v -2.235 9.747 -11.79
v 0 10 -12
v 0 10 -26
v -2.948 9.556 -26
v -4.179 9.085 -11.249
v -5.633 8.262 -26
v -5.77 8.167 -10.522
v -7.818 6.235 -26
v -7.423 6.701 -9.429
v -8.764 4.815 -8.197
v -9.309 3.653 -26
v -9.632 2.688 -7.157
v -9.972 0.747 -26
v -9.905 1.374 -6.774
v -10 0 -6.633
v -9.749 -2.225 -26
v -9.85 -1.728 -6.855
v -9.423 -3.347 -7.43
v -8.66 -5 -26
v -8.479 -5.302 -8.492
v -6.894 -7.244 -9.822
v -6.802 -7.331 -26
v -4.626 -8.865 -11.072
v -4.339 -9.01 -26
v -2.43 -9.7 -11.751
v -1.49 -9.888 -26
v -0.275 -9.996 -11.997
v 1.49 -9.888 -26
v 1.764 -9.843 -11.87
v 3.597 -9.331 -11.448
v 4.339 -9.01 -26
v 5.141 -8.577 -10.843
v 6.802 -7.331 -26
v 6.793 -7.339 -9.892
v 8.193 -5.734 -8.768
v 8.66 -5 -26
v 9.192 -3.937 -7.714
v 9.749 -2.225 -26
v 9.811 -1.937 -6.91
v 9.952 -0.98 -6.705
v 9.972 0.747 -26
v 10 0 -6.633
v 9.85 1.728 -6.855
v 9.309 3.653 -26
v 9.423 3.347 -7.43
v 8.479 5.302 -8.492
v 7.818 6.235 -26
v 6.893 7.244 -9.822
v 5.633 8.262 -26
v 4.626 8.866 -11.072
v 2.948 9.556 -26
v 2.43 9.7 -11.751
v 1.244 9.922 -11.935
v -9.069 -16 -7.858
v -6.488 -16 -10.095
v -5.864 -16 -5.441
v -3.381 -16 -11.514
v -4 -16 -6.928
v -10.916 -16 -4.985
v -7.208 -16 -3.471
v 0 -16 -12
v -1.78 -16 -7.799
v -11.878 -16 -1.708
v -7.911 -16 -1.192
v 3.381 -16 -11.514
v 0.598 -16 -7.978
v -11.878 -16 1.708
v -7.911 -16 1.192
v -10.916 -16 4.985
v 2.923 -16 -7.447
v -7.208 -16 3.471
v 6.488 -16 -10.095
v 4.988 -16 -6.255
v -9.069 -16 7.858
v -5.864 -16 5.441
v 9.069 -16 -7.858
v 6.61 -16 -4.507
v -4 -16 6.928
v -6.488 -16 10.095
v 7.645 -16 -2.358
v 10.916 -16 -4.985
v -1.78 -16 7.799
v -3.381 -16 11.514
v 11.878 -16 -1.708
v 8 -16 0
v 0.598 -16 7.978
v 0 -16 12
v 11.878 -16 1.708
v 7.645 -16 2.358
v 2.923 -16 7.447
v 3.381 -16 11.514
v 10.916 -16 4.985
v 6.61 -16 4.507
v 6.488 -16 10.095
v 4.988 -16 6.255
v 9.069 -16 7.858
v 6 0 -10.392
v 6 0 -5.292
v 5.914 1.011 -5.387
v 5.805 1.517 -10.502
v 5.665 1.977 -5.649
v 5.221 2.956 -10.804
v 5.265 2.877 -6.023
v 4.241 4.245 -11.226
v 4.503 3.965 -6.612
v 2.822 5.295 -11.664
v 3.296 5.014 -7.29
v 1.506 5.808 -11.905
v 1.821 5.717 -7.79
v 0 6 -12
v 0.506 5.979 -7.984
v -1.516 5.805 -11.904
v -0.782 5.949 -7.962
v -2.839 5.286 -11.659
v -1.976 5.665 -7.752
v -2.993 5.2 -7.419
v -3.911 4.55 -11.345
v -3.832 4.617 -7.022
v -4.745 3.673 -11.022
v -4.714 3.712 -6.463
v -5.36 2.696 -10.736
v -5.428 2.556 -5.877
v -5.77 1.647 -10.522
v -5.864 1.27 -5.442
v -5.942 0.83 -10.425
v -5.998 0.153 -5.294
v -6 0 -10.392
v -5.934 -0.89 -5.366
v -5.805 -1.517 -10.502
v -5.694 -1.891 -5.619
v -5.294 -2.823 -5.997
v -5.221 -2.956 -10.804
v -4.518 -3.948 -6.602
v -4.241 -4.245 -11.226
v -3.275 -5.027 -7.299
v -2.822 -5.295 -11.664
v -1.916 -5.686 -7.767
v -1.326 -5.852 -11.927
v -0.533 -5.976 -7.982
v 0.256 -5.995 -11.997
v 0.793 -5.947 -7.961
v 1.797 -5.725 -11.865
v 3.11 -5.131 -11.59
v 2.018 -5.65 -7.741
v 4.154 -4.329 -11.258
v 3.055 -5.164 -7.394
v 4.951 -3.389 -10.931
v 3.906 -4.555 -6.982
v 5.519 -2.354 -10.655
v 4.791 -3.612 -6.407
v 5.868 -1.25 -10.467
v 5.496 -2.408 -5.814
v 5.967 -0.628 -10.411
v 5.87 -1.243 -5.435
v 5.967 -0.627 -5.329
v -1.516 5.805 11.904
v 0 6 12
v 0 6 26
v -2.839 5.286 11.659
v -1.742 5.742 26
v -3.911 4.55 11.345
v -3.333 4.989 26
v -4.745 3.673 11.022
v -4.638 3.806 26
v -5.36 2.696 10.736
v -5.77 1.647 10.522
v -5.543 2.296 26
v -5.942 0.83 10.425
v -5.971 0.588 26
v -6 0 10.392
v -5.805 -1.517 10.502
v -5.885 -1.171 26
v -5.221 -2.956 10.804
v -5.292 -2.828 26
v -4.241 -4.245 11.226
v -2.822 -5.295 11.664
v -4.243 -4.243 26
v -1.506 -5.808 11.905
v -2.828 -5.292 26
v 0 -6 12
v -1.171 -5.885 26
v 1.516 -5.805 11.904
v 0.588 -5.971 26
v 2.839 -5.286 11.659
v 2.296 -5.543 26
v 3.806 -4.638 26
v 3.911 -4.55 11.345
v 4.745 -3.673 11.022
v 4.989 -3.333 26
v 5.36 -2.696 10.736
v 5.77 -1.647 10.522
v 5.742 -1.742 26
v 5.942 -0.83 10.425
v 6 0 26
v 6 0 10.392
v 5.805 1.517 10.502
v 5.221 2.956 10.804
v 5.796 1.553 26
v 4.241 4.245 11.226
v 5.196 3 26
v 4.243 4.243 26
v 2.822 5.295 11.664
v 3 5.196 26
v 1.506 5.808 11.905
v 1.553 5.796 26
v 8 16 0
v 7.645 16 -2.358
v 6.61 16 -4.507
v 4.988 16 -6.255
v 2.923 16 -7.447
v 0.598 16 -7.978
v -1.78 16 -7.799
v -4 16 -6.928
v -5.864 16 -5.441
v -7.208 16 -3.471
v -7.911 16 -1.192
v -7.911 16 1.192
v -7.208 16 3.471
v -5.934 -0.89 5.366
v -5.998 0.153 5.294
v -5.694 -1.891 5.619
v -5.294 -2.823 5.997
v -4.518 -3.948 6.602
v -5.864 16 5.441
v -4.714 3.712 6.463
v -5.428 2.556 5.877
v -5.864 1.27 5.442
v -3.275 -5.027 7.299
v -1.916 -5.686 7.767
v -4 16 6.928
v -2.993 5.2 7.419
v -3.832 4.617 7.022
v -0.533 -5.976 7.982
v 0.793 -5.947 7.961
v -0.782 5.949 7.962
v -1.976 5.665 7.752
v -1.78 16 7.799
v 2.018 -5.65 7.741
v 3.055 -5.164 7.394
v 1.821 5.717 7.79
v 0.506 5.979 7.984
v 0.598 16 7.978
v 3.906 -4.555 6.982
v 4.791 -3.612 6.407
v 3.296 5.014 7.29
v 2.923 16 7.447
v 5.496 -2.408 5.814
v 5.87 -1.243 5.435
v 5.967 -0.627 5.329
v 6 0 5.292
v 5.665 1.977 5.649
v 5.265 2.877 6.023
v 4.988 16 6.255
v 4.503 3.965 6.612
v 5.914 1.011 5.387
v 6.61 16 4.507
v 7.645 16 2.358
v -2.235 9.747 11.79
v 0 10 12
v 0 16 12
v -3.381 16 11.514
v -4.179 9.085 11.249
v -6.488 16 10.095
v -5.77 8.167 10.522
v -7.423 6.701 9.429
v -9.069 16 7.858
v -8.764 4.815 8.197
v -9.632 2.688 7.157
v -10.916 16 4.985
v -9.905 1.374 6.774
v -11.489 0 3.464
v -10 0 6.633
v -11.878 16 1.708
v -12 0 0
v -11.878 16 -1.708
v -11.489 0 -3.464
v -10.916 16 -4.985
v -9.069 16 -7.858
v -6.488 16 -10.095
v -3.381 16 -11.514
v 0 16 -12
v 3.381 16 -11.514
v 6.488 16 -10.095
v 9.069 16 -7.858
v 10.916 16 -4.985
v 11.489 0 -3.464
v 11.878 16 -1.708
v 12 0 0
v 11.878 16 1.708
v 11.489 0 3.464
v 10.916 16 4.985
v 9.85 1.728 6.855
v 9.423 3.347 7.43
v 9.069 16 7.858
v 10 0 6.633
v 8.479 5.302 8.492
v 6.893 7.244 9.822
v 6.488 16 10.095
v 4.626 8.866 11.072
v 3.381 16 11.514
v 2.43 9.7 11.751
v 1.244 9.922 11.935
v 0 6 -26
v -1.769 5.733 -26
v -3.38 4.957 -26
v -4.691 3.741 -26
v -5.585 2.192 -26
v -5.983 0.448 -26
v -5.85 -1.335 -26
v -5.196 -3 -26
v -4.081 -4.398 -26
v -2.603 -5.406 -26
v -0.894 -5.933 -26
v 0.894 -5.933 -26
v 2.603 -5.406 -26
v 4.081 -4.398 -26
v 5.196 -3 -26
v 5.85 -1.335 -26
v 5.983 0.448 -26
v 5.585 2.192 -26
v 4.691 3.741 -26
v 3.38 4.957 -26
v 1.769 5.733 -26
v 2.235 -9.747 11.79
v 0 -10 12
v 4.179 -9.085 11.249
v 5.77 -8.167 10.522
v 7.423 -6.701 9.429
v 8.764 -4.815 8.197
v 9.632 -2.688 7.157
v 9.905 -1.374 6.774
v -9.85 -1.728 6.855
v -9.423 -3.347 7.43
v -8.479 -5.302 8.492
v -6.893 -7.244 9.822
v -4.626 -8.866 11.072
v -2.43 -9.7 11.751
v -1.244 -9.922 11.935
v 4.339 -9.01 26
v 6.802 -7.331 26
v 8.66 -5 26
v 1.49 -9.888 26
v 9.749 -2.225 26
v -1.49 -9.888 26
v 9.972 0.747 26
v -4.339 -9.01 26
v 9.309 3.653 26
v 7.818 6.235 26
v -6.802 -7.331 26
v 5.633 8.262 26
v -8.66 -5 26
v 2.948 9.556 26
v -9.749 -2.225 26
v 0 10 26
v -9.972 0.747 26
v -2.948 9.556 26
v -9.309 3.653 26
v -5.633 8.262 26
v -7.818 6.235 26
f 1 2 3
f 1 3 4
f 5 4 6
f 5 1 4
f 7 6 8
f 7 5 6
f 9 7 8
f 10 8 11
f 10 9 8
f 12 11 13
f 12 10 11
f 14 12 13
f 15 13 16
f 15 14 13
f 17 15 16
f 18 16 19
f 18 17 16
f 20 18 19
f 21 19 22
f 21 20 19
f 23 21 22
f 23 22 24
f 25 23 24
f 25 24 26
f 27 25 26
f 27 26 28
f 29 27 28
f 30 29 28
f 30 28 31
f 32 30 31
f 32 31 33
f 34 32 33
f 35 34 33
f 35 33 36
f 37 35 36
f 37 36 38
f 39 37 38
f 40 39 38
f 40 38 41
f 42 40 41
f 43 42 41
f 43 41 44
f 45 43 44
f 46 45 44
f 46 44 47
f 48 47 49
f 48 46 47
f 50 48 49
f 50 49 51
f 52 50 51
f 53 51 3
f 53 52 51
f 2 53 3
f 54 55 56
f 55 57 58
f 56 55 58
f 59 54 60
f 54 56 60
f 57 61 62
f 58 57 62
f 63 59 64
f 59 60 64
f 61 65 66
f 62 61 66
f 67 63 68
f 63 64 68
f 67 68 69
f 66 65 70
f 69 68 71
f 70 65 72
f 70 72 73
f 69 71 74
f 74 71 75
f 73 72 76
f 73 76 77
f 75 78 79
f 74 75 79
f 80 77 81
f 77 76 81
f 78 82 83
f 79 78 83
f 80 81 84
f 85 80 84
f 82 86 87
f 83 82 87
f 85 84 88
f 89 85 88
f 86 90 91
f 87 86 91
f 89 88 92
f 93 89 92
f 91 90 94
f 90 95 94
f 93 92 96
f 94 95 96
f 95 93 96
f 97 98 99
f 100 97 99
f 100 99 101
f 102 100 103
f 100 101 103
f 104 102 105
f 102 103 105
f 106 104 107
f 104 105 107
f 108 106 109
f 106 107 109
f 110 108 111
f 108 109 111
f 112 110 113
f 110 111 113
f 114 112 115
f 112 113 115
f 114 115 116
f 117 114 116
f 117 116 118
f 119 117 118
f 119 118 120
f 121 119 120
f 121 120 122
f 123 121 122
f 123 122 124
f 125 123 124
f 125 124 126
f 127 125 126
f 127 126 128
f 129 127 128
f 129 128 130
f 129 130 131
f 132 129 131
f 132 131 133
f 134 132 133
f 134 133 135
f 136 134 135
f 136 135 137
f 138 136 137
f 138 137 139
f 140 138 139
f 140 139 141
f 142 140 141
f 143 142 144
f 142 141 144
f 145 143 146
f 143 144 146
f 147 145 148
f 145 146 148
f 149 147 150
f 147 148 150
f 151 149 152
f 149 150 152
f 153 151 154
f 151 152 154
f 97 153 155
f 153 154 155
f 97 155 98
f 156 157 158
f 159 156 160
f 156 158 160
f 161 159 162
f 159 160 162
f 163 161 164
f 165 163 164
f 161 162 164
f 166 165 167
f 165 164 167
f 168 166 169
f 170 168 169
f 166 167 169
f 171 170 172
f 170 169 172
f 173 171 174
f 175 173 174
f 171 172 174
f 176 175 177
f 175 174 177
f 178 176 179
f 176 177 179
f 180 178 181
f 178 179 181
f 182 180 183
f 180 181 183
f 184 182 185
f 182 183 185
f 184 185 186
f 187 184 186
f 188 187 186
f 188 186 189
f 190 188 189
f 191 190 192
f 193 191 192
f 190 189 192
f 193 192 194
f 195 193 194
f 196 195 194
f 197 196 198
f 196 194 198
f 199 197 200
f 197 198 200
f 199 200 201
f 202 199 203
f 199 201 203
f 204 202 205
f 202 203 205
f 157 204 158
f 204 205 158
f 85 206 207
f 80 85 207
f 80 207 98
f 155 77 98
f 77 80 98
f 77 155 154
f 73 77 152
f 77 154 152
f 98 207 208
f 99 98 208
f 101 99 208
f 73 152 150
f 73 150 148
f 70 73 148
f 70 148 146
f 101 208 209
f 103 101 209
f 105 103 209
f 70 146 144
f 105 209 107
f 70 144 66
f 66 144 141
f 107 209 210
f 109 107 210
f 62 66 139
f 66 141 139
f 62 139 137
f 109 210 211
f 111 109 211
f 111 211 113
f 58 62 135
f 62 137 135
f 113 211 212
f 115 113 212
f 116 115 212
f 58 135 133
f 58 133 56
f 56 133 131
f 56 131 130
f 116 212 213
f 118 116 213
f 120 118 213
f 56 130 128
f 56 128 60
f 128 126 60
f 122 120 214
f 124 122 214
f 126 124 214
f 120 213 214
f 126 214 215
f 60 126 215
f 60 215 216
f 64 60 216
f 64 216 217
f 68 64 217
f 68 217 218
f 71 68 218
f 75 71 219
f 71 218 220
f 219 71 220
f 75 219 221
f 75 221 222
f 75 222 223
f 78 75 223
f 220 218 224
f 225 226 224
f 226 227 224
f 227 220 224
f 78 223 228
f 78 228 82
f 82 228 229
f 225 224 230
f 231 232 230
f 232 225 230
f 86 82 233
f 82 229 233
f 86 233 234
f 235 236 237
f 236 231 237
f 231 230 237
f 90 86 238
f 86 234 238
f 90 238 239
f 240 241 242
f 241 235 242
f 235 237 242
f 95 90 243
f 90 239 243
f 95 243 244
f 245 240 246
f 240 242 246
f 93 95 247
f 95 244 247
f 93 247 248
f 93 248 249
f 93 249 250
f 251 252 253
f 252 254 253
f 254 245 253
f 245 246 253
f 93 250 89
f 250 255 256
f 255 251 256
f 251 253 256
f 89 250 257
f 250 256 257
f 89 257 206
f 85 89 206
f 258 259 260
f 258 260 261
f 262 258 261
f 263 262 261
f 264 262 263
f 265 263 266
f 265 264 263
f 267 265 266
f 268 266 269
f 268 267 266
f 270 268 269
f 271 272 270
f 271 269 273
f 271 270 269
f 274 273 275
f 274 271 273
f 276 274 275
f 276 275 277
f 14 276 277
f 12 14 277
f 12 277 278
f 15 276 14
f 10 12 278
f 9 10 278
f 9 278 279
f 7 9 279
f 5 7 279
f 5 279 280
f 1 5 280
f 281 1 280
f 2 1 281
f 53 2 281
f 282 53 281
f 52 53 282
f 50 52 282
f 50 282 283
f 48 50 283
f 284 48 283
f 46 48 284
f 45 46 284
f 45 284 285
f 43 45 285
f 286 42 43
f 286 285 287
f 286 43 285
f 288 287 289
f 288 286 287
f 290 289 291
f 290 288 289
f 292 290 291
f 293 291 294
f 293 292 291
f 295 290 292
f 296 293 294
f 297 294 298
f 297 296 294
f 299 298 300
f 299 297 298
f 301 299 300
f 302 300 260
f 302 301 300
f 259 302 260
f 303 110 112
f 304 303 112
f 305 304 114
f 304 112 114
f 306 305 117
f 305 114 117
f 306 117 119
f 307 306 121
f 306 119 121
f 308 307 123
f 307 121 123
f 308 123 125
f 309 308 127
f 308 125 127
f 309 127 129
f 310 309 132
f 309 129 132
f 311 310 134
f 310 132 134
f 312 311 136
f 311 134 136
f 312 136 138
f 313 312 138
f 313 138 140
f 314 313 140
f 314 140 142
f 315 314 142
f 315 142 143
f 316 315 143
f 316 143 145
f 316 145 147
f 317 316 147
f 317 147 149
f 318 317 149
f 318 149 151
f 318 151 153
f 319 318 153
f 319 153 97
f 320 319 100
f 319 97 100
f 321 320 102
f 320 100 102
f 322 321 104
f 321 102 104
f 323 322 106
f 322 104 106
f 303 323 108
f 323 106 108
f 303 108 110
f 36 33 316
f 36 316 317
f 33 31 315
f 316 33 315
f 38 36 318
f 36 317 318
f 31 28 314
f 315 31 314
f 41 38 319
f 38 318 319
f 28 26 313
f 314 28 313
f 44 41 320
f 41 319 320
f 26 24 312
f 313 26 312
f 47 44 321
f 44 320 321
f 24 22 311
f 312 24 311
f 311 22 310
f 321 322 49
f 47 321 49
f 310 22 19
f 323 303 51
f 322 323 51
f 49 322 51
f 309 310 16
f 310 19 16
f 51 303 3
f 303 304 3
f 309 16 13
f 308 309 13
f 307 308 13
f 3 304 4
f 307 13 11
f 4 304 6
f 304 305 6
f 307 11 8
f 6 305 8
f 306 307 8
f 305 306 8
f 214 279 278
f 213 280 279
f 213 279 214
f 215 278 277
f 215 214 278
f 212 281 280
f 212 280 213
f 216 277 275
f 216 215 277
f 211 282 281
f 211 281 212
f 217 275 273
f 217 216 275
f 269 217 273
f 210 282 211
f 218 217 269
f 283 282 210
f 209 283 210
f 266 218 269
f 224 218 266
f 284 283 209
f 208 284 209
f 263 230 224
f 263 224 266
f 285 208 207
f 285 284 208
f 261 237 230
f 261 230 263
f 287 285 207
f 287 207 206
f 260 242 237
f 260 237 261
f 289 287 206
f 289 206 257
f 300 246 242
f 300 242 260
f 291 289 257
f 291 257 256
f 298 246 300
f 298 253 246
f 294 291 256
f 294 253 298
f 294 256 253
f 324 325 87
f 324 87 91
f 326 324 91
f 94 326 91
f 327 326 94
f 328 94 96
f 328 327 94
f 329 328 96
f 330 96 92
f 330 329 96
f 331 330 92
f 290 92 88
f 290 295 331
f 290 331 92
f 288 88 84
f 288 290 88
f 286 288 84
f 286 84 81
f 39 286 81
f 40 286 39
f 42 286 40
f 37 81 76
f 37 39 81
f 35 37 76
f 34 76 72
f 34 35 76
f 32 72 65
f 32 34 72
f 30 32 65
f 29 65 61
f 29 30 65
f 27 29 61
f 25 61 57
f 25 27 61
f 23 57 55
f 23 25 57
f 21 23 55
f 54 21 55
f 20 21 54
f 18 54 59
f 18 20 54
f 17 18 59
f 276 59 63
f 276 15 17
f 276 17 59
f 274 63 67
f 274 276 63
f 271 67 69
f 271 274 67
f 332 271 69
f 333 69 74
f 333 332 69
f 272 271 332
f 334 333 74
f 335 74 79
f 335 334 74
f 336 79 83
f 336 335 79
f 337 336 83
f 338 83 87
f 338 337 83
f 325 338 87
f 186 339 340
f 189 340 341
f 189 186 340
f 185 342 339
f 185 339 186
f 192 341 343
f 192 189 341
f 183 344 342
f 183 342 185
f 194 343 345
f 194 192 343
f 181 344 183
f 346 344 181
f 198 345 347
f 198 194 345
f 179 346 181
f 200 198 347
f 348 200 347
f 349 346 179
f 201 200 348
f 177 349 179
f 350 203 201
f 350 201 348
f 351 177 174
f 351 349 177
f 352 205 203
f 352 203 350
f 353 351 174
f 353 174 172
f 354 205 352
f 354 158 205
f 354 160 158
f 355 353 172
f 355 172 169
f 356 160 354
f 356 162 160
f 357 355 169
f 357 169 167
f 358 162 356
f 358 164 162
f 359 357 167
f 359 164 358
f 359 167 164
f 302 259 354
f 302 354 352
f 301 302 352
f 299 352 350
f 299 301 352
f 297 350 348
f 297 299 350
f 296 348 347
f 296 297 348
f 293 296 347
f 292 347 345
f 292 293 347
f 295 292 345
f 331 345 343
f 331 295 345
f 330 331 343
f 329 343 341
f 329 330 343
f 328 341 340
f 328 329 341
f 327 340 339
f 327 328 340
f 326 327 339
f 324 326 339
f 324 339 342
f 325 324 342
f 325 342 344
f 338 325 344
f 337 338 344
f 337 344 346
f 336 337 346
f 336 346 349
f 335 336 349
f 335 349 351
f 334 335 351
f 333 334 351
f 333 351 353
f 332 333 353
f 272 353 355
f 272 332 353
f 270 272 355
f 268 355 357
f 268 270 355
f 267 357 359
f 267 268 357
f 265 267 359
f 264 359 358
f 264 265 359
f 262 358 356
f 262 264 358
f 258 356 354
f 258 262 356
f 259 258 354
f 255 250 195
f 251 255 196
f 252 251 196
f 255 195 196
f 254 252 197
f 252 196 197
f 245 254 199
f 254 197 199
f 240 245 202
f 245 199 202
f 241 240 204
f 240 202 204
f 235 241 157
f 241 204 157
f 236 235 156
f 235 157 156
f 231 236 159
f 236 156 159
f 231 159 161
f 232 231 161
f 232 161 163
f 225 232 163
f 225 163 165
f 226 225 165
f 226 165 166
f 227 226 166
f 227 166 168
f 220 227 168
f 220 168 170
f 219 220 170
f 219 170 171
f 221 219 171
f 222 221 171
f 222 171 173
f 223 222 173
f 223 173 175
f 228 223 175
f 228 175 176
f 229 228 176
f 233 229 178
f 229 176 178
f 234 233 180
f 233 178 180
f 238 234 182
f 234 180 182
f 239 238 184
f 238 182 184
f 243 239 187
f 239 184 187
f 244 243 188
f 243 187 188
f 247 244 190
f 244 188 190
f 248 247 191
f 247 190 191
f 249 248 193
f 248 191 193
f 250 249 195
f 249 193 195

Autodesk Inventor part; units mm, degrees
ref_plane "YZ Plane" through (0, 0, 0) normal (1, 0, 0) x (0, 1, 0)
ref_plane "XZ Plane" through (0, 0, 0) normal (0, 1, 0) x (-1, 0, 0)
ref_plane "XY Plane" through (0, 0, 0) normal (0, 0, 1) x (1, 0, 0)
sketch "Sketch8" plane through (0, 0, 0) normal (1, 0, 0) x (0, 1, 0)
  line L0 (0, 0) -> (0, -26)
  line L1 (0, -26) -> (10, -26)
  line L2 (0, 0) -> (16, 0) construction
  line L3 (10, -26) -> (10, 0)
  line L4 (0, 0) -> (0, 26)
  line L5 (0, 26) -> (10, 26)
  line L6 (10, 26) -> (10, 0)
  line L7 (6, -26) -> (6, 26)
  dimension "d26" = 26
  dimension "d27" = 16
  dimension "d28" = 10
  dimension "d29" = 6
revolve "Revolution1" add sketch "Sketch8" angle 360 about axis through (0, 0, 0) along (0, 0, 1) contours L7 L5 L6 L3 L1
sketch "Sketch9" plane through (0, 0, 0) normal (1, 0, 0) x (0, 1, 0)
  line L0 (0, 0) -> (16, 0)
  line L1 (16, 0) -> (16, 12)
  line L2 (16, 12) -> (0, 12)
  line L3 (0, 12) -> (0, 0)
  line L4 (0, 0) -> (-16, 0)
  line L5 (-16, 0) -> (-16, 12)
  line L6 (-16, 12) -> (0, 12)
  line L7 (0, 12) -> (0, 0)
  dimension "d31" = 16
  dimension "d32" = 16
  dimension "d33" = 12
revolve "Revolution2" add sketch "Sketch9" angle 360 about axis through (0, 0, 0) along (0, 1, 0)
sketch "Sketch10" plane through (0, 16, 0) normal (0, 1, 0) x (1, 0, 0)
  circle A0 centre (0, 0) radius 8
  dimension "d35" = 16
extrude "Extrusion8" cut sketch "Sketch10" against normal through all
sketch "Sketch11" plane through (0, 0, 26) normal (0, 0, 1) x (1, 0, 0)
  circle A0 centre (0, 0) radius 6 projected
extrude "Extrusion9" cut sketch "Sketch11" against normal through all
properties part number "Crank"
